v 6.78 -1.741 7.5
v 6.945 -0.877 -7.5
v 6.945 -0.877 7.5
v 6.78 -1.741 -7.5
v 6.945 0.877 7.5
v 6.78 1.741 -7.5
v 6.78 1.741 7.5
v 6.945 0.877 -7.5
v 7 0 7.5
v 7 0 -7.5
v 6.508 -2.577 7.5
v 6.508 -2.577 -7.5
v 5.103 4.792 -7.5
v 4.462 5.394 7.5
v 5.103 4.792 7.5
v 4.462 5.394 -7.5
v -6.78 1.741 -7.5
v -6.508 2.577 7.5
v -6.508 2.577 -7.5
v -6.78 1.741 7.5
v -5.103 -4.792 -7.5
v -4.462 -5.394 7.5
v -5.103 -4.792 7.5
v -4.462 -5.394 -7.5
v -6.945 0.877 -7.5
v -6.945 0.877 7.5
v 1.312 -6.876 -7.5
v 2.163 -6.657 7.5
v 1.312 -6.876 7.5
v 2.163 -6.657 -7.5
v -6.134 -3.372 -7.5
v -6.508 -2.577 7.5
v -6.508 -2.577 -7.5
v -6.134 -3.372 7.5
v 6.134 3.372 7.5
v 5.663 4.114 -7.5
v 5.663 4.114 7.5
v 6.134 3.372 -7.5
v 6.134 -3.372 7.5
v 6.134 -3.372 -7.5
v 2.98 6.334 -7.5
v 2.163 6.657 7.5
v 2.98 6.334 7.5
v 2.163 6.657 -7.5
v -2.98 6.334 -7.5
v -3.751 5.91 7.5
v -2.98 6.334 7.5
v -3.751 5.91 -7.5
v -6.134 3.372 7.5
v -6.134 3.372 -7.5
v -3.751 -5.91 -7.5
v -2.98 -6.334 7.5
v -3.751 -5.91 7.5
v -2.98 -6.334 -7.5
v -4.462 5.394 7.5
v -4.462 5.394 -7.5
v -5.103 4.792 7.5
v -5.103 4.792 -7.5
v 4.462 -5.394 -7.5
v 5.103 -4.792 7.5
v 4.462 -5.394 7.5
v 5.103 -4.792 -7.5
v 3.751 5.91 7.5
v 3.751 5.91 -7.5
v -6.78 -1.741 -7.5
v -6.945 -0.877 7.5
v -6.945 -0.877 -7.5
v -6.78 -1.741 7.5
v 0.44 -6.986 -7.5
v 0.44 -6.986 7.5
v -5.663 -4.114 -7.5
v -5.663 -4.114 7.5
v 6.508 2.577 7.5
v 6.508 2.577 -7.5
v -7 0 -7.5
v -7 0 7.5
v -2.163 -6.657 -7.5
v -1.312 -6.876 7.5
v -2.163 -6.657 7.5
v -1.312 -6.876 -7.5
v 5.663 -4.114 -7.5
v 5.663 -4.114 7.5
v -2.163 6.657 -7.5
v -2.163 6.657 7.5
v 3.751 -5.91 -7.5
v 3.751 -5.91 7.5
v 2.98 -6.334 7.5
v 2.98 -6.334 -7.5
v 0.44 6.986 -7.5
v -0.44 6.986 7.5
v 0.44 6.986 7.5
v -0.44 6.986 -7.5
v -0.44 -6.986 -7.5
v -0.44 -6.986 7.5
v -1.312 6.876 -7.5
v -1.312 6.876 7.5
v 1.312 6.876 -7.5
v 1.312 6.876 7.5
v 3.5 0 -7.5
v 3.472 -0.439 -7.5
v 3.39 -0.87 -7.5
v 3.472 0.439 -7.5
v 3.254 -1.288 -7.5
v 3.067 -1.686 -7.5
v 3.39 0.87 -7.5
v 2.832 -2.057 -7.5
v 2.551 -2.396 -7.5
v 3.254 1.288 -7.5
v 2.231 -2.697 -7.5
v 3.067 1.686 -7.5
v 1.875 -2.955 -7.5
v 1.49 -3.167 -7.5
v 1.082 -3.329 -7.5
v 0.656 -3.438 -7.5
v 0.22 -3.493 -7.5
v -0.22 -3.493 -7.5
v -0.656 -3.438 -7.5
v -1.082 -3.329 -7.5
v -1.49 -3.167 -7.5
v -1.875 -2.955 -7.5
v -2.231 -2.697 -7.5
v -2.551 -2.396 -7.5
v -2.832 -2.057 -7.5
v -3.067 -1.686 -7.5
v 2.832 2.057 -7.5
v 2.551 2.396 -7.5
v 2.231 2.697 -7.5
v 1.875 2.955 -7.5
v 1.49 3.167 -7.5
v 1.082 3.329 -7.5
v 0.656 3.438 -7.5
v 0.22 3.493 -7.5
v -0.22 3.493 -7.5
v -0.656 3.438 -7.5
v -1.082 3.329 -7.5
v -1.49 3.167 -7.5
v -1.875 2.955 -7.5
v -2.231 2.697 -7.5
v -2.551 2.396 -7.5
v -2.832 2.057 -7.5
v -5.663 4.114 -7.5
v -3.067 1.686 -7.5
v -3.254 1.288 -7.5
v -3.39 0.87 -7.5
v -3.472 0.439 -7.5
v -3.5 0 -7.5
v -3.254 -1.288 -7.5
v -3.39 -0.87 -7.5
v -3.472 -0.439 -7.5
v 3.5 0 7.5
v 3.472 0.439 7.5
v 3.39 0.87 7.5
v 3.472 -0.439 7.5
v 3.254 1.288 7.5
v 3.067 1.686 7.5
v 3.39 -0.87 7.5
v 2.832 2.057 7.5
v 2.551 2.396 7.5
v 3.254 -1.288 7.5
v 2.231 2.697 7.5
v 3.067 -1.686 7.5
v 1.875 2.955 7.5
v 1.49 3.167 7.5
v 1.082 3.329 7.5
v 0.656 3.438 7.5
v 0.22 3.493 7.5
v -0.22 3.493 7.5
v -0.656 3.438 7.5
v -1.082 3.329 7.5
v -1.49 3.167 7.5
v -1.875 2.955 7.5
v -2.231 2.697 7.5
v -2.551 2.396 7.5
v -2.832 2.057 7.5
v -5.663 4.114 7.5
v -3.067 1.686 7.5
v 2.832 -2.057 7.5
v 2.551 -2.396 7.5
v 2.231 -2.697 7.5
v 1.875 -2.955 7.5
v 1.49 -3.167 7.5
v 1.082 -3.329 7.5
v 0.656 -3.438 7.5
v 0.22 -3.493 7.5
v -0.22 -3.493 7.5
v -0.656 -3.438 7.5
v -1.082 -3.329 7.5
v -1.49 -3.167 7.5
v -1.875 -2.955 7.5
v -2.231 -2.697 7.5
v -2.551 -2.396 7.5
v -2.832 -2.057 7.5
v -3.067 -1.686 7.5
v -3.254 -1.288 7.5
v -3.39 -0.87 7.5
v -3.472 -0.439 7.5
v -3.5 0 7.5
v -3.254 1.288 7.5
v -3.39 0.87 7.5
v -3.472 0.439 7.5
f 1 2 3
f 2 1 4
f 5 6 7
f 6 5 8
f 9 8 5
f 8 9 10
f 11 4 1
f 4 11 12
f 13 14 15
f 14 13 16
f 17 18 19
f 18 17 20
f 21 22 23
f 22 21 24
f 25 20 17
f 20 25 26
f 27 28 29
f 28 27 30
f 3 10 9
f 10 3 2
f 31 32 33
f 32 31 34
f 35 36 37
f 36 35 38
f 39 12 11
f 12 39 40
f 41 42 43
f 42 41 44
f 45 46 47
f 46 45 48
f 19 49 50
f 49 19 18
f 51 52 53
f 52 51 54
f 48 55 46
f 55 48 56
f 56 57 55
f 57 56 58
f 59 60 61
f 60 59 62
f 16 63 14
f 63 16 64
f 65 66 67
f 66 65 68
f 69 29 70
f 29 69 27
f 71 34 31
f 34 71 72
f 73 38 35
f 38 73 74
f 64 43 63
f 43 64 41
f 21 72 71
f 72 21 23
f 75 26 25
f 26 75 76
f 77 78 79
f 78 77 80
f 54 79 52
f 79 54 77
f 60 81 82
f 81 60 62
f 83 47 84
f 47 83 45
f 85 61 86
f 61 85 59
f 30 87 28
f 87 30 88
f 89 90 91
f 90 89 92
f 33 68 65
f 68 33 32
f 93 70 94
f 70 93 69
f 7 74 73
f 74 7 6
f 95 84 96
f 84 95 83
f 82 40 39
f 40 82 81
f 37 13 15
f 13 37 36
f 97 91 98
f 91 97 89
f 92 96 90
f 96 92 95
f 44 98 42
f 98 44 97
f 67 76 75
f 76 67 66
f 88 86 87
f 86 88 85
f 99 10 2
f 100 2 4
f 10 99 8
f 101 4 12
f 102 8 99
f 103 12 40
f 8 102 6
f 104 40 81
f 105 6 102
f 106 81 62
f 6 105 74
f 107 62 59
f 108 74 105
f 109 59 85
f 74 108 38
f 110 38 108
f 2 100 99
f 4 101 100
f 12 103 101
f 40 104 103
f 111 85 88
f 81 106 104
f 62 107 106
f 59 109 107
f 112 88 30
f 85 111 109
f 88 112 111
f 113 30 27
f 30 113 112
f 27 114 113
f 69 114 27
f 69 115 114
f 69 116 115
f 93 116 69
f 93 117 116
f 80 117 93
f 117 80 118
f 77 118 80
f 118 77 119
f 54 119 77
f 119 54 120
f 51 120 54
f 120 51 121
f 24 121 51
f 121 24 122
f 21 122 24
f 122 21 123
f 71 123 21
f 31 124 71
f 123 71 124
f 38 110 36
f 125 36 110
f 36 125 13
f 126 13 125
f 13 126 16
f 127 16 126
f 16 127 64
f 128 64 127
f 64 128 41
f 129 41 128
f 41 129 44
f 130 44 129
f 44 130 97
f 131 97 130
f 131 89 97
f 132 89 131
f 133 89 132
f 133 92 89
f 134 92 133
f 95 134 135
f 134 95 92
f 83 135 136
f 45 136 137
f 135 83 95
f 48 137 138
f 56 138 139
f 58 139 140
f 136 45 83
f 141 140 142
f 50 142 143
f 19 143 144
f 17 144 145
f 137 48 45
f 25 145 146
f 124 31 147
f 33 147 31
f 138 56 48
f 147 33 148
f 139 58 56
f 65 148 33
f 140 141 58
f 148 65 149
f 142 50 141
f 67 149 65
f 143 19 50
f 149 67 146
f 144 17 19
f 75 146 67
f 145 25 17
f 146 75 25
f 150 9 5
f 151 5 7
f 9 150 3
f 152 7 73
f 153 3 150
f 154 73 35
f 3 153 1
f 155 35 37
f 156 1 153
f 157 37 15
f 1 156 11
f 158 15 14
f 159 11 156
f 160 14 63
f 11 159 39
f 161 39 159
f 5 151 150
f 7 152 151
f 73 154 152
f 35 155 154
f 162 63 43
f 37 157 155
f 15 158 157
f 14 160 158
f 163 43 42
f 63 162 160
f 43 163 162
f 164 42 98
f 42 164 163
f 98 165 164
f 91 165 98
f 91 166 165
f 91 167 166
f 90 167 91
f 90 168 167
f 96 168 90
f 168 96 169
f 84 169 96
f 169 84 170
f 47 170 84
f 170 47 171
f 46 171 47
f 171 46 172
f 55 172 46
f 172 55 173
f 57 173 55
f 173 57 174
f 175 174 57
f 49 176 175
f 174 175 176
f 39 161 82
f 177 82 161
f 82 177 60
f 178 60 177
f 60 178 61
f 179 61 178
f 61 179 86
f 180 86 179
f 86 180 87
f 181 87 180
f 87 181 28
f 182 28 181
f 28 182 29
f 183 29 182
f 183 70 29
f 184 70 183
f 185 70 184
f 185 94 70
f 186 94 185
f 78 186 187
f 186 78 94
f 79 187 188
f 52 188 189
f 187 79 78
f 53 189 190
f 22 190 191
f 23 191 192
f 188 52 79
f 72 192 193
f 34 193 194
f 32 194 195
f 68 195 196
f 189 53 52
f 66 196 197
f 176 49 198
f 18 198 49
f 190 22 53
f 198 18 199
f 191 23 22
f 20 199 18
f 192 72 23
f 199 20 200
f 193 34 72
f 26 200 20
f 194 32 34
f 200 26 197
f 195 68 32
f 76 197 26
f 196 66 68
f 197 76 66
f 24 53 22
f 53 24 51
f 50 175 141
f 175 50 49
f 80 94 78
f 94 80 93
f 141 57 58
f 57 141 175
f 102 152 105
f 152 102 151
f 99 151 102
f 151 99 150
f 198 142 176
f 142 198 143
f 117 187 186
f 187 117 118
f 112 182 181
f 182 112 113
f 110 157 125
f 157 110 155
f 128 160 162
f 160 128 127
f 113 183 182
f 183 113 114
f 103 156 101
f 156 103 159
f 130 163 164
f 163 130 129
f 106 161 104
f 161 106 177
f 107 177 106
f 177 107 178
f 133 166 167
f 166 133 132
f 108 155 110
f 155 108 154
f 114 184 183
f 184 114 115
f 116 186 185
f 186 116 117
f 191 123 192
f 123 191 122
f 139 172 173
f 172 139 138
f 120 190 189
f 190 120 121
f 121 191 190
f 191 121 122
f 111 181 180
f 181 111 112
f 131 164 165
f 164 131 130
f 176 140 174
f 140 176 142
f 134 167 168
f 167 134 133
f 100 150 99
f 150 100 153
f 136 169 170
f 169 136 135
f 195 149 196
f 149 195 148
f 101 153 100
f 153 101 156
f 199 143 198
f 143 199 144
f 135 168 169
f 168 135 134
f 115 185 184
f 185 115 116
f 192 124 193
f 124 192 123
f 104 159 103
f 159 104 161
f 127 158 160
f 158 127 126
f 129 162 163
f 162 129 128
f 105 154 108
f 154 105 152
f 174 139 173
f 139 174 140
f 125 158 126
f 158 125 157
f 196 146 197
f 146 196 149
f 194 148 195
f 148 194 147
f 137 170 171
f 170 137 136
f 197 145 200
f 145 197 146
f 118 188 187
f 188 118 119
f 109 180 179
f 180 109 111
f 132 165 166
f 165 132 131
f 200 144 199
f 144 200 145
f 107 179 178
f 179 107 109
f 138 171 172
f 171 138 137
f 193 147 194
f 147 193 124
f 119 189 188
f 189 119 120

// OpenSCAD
$fn = 50;


difference() {
	union() {
		translate(v = [0, 0, -7.5000000000]) {
			cylinder(h = 15, r = 7.0000000000);
		}
	}
	union() {
		translate(v = [0, 0, -100.0000000000]) {
			cylinder(h = 200, r = 3.5000000000);
		}
	}
}
